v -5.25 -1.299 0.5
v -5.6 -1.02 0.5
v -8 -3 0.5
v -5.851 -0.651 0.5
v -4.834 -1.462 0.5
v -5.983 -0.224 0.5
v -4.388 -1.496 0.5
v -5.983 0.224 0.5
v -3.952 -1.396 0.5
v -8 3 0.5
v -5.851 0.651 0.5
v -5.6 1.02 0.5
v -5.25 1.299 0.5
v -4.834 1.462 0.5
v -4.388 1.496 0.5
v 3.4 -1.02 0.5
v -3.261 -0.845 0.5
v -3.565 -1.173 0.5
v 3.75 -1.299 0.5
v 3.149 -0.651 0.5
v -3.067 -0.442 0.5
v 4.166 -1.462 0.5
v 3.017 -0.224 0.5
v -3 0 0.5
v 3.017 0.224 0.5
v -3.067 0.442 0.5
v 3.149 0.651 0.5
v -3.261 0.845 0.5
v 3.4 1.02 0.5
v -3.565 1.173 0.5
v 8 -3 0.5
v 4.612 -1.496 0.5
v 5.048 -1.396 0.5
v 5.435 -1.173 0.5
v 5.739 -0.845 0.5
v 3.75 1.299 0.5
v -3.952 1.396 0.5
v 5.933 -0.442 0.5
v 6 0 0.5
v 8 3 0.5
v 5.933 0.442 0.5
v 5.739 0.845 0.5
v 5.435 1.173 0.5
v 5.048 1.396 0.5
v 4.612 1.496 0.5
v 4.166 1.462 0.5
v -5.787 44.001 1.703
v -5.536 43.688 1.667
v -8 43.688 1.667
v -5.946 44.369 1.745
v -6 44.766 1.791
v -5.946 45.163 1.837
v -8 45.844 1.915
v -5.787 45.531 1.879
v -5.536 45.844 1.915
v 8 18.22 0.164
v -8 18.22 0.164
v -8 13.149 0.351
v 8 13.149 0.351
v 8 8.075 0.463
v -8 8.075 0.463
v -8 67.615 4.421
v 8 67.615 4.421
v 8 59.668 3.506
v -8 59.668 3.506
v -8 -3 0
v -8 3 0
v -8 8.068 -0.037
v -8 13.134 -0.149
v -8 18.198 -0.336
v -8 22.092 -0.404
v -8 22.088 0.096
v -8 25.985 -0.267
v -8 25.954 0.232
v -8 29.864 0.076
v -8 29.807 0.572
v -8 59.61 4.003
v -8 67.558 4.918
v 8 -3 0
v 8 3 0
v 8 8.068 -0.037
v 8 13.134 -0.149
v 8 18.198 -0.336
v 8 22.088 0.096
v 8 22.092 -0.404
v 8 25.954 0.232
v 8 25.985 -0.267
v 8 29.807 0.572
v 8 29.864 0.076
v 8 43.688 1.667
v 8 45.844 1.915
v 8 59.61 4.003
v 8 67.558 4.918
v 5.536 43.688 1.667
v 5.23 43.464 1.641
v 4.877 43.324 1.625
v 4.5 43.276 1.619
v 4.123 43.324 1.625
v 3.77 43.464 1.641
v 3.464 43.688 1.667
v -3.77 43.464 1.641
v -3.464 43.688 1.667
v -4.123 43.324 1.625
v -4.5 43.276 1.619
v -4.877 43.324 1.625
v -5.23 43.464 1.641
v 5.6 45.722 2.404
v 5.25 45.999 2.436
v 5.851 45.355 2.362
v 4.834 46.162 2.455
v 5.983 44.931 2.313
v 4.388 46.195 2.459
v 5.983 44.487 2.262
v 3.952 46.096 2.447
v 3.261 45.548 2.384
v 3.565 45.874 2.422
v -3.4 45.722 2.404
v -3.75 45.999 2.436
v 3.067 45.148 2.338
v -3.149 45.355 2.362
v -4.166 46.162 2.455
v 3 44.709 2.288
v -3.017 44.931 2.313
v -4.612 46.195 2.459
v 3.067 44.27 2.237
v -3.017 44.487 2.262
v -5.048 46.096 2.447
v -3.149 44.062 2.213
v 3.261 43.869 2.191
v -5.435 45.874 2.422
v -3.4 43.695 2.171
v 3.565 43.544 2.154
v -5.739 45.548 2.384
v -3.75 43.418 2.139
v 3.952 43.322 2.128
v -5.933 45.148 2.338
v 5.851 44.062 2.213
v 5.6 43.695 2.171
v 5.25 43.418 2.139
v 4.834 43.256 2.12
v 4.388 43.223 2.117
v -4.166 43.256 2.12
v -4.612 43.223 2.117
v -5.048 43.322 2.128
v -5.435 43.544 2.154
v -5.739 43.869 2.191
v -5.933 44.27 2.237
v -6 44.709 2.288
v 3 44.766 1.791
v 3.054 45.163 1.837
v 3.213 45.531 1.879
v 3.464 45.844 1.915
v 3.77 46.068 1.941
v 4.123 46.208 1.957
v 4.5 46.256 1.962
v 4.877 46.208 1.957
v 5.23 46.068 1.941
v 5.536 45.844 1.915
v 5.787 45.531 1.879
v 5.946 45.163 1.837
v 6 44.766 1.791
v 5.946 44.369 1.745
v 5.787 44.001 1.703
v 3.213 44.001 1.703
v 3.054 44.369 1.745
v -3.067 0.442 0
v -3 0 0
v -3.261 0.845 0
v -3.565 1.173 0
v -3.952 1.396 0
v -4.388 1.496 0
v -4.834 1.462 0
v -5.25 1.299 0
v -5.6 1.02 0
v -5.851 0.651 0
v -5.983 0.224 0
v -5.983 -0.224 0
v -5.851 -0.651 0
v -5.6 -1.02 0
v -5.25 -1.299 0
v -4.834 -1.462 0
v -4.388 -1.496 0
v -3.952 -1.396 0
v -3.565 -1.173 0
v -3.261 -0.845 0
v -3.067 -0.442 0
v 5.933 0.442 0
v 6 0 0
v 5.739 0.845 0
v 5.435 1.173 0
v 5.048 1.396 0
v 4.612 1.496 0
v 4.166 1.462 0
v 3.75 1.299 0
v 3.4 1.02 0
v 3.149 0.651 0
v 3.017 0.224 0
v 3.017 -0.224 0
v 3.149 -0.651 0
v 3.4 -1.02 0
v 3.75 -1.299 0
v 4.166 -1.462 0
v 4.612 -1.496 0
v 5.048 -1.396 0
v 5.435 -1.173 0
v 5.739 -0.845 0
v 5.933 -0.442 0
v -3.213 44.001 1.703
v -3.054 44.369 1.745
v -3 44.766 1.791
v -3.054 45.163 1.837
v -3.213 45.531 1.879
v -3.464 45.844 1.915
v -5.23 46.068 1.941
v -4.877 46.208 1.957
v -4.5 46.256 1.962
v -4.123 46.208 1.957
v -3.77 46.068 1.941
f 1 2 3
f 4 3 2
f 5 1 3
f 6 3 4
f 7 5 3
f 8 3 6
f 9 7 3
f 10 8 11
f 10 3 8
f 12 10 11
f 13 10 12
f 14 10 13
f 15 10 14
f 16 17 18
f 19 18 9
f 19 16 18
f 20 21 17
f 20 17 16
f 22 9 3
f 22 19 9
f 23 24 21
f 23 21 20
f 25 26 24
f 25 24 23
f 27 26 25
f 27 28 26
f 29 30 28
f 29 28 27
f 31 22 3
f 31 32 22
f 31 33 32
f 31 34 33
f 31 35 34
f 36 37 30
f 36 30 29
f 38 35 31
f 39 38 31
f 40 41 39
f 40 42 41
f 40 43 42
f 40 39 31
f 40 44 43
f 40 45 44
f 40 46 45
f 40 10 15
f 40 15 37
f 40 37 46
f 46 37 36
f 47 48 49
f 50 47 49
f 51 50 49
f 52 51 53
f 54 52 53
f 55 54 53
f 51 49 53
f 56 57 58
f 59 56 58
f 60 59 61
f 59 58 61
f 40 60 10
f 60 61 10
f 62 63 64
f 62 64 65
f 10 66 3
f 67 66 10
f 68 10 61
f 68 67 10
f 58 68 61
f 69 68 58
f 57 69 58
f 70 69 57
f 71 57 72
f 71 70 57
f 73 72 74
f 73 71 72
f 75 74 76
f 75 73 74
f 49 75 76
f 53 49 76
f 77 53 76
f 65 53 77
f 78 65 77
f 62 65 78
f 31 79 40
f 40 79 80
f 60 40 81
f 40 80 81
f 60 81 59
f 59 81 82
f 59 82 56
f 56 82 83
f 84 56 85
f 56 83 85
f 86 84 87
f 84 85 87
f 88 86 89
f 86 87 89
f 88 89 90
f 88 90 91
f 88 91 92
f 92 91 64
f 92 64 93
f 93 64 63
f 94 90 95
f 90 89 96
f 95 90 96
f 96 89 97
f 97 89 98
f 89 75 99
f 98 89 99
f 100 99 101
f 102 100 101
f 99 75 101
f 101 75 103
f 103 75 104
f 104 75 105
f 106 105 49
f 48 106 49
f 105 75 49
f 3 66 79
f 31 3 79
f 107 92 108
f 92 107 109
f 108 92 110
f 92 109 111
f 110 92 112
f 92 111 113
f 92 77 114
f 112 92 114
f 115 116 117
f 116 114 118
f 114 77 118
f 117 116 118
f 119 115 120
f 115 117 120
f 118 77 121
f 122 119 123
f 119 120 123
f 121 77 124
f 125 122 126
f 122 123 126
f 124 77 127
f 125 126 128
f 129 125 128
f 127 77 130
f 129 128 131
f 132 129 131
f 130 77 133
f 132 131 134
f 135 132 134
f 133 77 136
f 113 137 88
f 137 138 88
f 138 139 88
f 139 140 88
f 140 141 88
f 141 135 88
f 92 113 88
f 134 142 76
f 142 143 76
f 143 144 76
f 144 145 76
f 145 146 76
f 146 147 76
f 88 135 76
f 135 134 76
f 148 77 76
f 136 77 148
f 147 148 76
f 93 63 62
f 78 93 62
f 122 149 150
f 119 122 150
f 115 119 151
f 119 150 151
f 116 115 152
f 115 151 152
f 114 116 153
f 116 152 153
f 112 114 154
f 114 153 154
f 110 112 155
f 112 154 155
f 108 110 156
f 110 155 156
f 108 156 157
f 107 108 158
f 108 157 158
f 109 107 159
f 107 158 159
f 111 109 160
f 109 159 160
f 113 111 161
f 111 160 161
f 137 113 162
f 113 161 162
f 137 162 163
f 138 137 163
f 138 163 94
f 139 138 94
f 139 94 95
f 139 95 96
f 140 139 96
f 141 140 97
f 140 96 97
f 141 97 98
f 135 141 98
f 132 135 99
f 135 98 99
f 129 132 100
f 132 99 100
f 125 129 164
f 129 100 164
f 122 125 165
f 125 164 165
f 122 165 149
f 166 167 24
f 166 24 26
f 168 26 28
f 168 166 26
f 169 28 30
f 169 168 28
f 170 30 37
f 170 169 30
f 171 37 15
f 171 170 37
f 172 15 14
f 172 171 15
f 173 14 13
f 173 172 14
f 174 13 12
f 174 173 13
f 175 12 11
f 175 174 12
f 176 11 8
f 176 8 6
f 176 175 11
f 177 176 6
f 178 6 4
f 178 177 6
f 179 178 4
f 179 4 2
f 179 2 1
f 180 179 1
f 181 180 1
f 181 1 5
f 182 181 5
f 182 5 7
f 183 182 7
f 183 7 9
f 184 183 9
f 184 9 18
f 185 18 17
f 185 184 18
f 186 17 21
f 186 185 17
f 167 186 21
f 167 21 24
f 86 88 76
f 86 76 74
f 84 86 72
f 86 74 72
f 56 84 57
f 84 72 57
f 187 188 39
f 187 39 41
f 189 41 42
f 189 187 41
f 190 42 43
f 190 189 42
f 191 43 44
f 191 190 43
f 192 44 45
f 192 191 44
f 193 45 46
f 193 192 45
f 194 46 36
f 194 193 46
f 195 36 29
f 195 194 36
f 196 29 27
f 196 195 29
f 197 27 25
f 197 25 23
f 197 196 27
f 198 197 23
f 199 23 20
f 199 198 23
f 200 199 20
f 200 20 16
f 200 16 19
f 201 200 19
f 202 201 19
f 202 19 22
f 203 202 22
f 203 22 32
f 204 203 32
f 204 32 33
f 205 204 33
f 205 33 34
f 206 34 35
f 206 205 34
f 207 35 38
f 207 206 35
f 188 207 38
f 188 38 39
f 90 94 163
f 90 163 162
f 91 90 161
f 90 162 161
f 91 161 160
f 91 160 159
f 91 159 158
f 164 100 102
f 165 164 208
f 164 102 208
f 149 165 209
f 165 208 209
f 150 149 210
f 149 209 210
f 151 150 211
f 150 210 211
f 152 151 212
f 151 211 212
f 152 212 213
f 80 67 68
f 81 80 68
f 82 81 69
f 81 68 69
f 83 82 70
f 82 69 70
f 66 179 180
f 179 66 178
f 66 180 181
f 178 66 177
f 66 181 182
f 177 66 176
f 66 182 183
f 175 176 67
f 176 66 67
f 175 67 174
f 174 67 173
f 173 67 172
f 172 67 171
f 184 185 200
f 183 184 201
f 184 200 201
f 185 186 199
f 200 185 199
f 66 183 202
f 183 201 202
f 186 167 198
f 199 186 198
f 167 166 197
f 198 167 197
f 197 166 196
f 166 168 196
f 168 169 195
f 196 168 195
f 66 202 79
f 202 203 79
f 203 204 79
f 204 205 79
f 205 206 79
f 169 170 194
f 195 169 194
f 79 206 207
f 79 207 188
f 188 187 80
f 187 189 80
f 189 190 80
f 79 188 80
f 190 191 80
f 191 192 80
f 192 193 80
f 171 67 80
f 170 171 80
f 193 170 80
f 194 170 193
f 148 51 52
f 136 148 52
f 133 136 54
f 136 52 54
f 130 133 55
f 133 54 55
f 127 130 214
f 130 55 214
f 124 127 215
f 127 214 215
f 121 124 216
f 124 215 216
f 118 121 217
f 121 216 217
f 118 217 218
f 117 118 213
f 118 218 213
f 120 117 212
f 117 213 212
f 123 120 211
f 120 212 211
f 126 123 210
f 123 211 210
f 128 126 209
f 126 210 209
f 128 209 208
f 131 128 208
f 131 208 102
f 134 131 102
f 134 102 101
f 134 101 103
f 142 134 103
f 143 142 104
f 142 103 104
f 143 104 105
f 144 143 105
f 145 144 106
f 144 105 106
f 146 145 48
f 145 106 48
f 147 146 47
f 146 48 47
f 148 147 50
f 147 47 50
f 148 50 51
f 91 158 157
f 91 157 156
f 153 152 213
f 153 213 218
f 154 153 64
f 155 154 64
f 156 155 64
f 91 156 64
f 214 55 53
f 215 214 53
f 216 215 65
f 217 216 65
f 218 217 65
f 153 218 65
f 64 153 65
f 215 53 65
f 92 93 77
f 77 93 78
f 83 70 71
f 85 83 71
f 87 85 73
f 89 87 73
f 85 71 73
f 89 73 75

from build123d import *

# Parameters (mm, degrees)
SKETCH1_W           = 16
SKETCH1_H           = 6
SKETCH1_R           = 1.5
BOSS_EXTRUDE1_DEPTH = 0.5
BOSS_EXTRUDE2_DEPTH = 16
SKETCH3_R           = 1.5
CUT_EXTRUDE1_DEPTH  = 8.659646886
SKETCH4_W           = 16
SKETCH4_H           = 8
BOSS_EXTRUDE3_DEPTH = 0.5


with BuildPart() as part:
    # Sketch1 → Boss-Extrude1 (new body)
    with BuildSketch(Plane.XY):
        Rectangle(SKETCH1_W, SKETCH1_H)
        with Locations((-4.5, 0)):
            Circle(SKETCH1_R, mode=Mode.SUBTRACT)
        with Locations((4.5, 0)):
            Circle(SKETCH1_R, mode=Mode.SUBTRACT)
    extrude(amount=BOSS_EXTRUDE1_DEPTH)

    # Sketch2 → Boss-Extrude2 (add)
    with BuildSketch(Plane.ZY.offset(8)):
        with BuildLine():
            ThreePointArc((0.163996883, 18.220231427), (0.415988989, 10.611969896), (0.5, 3))
            Line((0.5, 3), (0, 3))
            ThreePointArc((0, 3), (-0.083889217, 10.600934542), (-0.335516001, 18.198166096))
            ThreePointArc((-0.335516001, 18.198166096), (-0.36155667, 24.039453598), (0.075644223, 29.864414815))
            Line((0.075644223, 29.864414815), (1.666879953, 43.688343289))
            Line((1.666879953, 43.688343289), (1.914976685, 45.843694255))
            Line((1.914976685, 45.843694255), (3.506212415, 59.667622728))
            Line((3.506212415, 59.667622728), (4.002932547, 59.610446591))
            Line((4.002932547, 59.610446591), (0.572364355, 29.807238679))
            ThreePointArc((0.572364355, 29.807238679), (0.138133092, 24.021842748), (0.163996883, 18.220231427))
        make_face()
    extrude(amount=-BOSS_EXTRUDE2_DEPTH)

    # Sketch3 → Cut-Extrude1 (cut, through all)
    with BuildSketch(Plane(origin=(0, 0.381926952, -3.318006735), x_dir=(-1, 0, 0), z_dir=(0, 0.114352273, -0.993440264))):
        with Locations((-4.5, 44.67716222)):
            Circle(SKETCH3_R)
        with Locations((4.5, 44.67716222)):
            Circle(SKETCH3_R)
    extrude(amount=-CUT_EXTRUDE1_DEPTH, mode=Mode.SUBTRACT)

    # Sketch4 → Boss-Extrude3 (add)
    with BuildSketch(Plane(origin=(0, 0.381926952, -3.318006735), x_dir=(-1, 0, 0), z_dir=(0, 0.114352273, -0.993440264))):
        with Locations((0, 63.67716222)):
            Rectangle(SKETCH4_W, SKETCH4_H)
    extrude(amount=-BOSS_EXTRUDE3_DEPTH)


solid = part.part
